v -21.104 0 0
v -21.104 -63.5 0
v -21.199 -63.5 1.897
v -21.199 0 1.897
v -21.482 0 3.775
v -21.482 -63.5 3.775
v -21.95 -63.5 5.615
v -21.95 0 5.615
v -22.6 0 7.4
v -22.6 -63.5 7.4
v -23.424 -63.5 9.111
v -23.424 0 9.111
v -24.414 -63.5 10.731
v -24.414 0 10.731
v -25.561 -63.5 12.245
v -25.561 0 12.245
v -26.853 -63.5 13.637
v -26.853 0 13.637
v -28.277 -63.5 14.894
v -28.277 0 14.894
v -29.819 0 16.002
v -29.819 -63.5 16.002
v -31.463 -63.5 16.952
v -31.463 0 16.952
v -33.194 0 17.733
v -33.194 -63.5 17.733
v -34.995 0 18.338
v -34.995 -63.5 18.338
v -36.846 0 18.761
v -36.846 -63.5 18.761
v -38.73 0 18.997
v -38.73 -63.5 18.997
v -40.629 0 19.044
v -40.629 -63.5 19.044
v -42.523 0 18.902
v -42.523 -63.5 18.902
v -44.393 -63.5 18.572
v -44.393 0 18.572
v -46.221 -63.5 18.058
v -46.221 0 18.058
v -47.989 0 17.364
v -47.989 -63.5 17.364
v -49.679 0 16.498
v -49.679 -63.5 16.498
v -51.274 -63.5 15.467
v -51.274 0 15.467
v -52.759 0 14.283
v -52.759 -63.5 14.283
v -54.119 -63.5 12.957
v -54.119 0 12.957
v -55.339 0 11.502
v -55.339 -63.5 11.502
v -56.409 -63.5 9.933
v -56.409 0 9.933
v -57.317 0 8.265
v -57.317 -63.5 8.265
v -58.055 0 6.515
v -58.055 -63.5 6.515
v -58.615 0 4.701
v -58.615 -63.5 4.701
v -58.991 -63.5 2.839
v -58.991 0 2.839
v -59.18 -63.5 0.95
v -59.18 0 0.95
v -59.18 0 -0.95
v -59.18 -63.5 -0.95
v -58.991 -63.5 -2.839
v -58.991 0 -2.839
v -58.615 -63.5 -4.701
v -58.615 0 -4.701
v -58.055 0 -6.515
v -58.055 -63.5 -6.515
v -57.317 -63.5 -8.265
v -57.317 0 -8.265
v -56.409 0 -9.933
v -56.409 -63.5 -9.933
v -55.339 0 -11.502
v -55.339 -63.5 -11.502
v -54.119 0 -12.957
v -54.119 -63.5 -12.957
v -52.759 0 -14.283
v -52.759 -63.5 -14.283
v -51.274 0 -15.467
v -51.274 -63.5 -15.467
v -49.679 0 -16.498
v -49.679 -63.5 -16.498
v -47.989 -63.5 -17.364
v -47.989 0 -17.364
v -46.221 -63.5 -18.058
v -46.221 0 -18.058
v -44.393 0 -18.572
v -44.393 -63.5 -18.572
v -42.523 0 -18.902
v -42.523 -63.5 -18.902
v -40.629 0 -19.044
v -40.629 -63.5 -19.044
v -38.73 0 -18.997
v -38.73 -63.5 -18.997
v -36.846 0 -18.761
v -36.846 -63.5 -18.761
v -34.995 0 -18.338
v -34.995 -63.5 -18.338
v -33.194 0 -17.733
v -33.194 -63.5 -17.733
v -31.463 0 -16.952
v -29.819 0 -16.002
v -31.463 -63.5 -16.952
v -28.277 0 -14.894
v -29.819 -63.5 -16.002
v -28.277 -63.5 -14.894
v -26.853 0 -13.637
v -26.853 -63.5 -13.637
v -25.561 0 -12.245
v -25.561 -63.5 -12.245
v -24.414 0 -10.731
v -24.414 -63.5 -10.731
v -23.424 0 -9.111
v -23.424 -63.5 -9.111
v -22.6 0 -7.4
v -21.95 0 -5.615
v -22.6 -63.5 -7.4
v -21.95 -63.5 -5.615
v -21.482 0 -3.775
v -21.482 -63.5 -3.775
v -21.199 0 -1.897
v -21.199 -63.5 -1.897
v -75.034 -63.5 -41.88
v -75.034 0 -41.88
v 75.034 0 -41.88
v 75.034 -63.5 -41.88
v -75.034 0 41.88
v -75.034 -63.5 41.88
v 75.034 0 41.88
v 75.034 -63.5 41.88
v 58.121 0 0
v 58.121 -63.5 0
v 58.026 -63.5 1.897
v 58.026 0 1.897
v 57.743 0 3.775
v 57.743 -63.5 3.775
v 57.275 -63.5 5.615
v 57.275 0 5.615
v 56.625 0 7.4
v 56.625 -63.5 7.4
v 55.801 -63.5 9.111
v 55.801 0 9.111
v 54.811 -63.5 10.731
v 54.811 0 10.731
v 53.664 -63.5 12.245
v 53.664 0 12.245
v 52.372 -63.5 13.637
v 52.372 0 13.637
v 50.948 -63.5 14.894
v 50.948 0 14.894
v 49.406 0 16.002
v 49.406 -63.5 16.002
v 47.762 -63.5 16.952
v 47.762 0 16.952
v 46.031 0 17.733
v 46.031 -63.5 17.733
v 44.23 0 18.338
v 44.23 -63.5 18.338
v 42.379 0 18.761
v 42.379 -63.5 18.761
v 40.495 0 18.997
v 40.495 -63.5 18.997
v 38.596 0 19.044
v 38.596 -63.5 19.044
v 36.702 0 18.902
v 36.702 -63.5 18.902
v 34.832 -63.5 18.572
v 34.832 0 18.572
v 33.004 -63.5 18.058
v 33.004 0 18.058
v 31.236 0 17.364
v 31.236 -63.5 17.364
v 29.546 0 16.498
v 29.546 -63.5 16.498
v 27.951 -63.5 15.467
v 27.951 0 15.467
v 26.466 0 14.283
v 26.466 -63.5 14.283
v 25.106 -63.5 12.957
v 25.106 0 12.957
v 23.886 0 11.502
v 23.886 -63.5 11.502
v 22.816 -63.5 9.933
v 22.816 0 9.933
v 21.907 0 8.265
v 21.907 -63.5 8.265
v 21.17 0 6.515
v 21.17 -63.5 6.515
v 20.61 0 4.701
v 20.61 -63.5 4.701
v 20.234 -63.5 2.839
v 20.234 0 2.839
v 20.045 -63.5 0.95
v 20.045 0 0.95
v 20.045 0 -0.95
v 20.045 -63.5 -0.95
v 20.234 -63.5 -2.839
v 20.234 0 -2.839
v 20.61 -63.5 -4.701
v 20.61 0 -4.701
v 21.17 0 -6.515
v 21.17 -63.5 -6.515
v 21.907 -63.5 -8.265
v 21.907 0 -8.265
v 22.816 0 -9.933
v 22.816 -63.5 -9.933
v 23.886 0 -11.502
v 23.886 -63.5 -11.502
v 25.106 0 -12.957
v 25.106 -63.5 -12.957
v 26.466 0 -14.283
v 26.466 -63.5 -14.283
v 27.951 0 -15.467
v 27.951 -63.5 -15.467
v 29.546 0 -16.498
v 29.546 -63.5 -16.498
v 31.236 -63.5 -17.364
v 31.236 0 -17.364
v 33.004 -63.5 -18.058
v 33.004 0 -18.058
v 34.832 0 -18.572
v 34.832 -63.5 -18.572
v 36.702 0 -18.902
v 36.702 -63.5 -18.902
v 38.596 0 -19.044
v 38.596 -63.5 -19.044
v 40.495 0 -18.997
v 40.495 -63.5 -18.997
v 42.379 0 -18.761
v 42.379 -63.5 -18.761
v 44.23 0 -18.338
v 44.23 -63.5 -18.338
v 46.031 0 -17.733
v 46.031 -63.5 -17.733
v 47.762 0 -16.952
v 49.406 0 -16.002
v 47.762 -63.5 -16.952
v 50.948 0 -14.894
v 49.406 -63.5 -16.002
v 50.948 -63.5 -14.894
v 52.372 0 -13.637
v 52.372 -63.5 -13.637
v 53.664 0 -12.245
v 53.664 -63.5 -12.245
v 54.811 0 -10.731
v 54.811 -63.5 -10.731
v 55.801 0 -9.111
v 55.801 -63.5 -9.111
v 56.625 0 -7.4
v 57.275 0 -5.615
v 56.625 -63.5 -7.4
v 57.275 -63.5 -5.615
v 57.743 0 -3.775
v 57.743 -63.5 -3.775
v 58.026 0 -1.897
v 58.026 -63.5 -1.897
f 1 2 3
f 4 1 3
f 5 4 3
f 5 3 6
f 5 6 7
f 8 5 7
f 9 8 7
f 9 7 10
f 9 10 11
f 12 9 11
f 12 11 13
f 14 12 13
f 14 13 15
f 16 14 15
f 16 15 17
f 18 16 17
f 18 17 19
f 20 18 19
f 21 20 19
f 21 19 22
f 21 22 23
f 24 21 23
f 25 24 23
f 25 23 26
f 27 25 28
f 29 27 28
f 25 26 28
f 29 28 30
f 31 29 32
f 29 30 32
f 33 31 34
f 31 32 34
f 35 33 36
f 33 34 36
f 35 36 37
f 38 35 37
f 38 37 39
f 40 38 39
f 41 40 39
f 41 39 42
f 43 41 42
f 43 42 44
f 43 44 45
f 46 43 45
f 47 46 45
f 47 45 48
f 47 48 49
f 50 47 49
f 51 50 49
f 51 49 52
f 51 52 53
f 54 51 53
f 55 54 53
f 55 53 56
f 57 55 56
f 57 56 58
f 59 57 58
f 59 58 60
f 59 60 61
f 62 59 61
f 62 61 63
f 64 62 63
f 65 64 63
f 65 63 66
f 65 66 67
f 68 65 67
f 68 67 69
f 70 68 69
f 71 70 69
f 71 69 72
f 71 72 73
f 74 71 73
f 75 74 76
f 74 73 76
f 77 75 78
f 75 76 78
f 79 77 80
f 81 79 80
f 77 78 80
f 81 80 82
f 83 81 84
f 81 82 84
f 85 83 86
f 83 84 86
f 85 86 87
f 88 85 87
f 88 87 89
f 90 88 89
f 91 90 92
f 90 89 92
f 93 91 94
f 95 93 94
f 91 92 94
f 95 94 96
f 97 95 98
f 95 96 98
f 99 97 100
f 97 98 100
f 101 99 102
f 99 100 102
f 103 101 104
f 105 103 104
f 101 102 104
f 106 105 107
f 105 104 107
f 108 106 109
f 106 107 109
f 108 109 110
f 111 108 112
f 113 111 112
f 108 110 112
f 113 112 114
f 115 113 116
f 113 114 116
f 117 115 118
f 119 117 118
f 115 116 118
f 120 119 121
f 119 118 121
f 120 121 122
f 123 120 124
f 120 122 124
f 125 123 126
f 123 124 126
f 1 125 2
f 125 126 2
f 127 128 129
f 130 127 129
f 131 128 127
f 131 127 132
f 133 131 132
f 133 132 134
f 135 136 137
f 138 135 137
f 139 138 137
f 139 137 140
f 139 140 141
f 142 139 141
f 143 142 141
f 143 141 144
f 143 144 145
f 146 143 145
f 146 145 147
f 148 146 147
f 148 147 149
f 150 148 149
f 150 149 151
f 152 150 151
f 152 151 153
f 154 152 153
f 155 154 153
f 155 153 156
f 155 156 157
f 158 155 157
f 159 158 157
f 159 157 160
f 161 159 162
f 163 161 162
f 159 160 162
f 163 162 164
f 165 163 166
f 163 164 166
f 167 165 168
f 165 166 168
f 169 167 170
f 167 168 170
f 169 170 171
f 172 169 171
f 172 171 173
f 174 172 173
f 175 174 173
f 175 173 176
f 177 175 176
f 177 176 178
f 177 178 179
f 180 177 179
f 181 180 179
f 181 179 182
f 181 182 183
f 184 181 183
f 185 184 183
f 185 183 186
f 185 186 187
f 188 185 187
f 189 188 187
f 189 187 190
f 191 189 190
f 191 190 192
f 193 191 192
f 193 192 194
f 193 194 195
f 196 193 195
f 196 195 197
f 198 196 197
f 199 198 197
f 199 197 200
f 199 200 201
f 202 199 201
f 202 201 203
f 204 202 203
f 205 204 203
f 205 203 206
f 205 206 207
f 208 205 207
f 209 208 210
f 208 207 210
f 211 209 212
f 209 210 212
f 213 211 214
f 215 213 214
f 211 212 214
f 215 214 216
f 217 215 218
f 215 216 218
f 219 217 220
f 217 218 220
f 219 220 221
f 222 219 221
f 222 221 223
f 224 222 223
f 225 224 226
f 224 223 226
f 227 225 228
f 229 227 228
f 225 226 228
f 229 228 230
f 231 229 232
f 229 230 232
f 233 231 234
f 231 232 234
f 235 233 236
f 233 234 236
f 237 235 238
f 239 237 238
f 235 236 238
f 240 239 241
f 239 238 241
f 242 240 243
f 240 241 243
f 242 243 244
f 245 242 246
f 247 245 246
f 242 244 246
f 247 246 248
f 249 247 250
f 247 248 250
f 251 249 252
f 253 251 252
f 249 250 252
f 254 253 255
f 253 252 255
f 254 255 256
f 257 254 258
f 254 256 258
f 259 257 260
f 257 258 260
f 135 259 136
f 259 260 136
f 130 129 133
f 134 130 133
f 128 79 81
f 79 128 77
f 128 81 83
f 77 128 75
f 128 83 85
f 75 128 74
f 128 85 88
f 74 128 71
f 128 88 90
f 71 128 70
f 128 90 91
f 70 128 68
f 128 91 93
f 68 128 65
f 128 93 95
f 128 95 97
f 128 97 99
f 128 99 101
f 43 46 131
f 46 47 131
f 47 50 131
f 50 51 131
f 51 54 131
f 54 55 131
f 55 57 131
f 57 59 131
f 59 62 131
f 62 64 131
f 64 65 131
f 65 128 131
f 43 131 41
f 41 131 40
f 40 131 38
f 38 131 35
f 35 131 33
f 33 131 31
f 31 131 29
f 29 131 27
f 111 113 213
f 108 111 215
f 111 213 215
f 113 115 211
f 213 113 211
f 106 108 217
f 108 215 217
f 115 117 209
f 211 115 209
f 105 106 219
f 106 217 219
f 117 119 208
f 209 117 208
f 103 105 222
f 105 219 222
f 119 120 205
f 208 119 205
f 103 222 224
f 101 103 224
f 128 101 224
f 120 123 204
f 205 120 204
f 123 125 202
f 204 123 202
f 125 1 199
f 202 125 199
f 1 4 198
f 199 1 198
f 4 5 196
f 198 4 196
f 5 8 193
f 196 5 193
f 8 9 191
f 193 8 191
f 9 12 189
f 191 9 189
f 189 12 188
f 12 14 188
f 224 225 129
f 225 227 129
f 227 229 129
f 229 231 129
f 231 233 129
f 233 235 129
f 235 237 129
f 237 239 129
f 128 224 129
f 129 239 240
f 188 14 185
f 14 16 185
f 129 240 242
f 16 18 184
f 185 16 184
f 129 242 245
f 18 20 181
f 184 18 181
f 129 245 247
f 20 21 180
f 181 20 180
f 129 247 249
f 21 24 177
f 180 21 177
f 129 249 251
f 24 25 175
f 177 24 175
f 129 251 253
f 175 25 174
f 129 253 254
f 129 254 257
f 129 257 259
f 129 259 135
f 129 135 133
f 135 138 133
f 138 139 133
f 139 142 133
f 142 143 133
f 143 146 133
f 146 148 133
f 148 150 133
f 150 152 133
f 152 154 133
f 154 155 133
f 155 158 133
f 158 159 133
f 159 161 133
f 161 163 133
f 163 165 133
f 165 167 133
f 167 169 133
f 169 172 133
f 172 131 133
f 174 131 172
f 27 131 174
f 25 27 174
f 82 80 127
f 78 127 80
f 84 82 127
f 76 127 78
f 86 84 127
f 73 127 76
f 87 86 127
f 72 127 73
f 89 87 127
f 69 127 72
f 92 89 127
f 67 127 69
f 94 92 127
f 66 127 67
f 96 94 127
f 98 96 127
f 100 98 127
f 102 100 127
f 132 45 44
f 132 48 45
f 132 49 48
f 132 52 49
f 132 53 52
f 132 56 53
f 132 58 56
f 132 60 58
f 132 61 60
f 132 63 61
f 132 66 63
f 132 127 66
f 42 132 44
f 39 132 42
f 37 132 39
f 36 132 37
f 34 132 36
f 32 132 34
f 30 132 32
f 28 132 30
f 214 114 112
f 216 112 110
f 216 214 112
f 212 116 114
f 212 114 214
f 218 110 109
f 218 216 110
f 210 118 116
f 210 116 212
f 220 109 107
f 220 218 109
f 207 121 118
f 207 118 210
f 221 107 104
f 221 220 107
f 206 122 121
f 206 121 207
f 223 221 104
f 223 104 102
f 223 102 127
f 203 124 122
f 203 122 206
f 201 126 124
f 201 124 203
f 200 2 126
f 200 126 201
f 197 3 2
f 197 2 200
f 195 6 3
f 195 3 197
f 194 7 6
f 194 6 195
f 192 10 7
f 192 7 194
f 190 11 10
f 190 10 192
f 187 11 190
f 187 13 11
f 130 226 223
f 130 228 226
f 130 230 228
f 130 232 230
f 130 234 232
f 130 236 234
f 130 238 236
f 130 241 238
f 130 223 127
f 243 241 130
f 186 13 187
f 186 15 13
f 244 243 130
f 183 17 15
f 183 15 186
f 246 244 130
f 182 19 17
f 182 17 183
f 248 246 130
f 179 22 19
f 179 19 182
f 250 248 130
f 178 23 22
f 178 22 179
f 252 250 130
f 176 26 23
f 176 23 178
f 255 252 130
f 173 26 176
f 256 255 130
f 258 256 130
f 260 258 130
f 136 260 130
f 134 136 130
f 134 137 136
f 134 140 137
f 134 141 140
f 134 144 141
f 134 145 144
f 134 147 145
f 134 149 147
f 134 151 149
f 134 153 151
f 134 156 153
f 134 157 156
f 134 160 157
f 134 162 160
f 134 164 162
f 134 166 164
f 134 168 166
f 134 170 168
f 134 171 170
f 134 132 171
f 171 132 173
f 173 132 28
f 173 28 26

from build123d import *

# Parameters (mm, degrees)
F0_W     = 150.06873
F0_H     = 83.760024
F1_DEPTH = 63.5
F3_D     = 38.1
F5_D     = 38.1


with BuildPart() as f1:
    # F0 (on Front) → F1 (new body)
    with BuildSketch(Plane.XZ):
        Rectangle(F0_W, F0_H)
    extrude(amount=F1_DEPTH)

    # F3 (through all)
    with Locations(Plane(origin=(0, 0, 0), x_dir=(-1, 0, 0), z_dir=(0, 1, 0))):
        with Locations((-39.070934, 0)):
            Hole(F3_D / 2)

    # F5 (through all)
    with Locations(Plane(origin=(0, 0, 0), x_dir=(-1, 0, 0), z_dir=(0, 1, 0))):
        with Locations((40.15404, 0)):
            Hole(F5_D / 2)


solid = f1.part
